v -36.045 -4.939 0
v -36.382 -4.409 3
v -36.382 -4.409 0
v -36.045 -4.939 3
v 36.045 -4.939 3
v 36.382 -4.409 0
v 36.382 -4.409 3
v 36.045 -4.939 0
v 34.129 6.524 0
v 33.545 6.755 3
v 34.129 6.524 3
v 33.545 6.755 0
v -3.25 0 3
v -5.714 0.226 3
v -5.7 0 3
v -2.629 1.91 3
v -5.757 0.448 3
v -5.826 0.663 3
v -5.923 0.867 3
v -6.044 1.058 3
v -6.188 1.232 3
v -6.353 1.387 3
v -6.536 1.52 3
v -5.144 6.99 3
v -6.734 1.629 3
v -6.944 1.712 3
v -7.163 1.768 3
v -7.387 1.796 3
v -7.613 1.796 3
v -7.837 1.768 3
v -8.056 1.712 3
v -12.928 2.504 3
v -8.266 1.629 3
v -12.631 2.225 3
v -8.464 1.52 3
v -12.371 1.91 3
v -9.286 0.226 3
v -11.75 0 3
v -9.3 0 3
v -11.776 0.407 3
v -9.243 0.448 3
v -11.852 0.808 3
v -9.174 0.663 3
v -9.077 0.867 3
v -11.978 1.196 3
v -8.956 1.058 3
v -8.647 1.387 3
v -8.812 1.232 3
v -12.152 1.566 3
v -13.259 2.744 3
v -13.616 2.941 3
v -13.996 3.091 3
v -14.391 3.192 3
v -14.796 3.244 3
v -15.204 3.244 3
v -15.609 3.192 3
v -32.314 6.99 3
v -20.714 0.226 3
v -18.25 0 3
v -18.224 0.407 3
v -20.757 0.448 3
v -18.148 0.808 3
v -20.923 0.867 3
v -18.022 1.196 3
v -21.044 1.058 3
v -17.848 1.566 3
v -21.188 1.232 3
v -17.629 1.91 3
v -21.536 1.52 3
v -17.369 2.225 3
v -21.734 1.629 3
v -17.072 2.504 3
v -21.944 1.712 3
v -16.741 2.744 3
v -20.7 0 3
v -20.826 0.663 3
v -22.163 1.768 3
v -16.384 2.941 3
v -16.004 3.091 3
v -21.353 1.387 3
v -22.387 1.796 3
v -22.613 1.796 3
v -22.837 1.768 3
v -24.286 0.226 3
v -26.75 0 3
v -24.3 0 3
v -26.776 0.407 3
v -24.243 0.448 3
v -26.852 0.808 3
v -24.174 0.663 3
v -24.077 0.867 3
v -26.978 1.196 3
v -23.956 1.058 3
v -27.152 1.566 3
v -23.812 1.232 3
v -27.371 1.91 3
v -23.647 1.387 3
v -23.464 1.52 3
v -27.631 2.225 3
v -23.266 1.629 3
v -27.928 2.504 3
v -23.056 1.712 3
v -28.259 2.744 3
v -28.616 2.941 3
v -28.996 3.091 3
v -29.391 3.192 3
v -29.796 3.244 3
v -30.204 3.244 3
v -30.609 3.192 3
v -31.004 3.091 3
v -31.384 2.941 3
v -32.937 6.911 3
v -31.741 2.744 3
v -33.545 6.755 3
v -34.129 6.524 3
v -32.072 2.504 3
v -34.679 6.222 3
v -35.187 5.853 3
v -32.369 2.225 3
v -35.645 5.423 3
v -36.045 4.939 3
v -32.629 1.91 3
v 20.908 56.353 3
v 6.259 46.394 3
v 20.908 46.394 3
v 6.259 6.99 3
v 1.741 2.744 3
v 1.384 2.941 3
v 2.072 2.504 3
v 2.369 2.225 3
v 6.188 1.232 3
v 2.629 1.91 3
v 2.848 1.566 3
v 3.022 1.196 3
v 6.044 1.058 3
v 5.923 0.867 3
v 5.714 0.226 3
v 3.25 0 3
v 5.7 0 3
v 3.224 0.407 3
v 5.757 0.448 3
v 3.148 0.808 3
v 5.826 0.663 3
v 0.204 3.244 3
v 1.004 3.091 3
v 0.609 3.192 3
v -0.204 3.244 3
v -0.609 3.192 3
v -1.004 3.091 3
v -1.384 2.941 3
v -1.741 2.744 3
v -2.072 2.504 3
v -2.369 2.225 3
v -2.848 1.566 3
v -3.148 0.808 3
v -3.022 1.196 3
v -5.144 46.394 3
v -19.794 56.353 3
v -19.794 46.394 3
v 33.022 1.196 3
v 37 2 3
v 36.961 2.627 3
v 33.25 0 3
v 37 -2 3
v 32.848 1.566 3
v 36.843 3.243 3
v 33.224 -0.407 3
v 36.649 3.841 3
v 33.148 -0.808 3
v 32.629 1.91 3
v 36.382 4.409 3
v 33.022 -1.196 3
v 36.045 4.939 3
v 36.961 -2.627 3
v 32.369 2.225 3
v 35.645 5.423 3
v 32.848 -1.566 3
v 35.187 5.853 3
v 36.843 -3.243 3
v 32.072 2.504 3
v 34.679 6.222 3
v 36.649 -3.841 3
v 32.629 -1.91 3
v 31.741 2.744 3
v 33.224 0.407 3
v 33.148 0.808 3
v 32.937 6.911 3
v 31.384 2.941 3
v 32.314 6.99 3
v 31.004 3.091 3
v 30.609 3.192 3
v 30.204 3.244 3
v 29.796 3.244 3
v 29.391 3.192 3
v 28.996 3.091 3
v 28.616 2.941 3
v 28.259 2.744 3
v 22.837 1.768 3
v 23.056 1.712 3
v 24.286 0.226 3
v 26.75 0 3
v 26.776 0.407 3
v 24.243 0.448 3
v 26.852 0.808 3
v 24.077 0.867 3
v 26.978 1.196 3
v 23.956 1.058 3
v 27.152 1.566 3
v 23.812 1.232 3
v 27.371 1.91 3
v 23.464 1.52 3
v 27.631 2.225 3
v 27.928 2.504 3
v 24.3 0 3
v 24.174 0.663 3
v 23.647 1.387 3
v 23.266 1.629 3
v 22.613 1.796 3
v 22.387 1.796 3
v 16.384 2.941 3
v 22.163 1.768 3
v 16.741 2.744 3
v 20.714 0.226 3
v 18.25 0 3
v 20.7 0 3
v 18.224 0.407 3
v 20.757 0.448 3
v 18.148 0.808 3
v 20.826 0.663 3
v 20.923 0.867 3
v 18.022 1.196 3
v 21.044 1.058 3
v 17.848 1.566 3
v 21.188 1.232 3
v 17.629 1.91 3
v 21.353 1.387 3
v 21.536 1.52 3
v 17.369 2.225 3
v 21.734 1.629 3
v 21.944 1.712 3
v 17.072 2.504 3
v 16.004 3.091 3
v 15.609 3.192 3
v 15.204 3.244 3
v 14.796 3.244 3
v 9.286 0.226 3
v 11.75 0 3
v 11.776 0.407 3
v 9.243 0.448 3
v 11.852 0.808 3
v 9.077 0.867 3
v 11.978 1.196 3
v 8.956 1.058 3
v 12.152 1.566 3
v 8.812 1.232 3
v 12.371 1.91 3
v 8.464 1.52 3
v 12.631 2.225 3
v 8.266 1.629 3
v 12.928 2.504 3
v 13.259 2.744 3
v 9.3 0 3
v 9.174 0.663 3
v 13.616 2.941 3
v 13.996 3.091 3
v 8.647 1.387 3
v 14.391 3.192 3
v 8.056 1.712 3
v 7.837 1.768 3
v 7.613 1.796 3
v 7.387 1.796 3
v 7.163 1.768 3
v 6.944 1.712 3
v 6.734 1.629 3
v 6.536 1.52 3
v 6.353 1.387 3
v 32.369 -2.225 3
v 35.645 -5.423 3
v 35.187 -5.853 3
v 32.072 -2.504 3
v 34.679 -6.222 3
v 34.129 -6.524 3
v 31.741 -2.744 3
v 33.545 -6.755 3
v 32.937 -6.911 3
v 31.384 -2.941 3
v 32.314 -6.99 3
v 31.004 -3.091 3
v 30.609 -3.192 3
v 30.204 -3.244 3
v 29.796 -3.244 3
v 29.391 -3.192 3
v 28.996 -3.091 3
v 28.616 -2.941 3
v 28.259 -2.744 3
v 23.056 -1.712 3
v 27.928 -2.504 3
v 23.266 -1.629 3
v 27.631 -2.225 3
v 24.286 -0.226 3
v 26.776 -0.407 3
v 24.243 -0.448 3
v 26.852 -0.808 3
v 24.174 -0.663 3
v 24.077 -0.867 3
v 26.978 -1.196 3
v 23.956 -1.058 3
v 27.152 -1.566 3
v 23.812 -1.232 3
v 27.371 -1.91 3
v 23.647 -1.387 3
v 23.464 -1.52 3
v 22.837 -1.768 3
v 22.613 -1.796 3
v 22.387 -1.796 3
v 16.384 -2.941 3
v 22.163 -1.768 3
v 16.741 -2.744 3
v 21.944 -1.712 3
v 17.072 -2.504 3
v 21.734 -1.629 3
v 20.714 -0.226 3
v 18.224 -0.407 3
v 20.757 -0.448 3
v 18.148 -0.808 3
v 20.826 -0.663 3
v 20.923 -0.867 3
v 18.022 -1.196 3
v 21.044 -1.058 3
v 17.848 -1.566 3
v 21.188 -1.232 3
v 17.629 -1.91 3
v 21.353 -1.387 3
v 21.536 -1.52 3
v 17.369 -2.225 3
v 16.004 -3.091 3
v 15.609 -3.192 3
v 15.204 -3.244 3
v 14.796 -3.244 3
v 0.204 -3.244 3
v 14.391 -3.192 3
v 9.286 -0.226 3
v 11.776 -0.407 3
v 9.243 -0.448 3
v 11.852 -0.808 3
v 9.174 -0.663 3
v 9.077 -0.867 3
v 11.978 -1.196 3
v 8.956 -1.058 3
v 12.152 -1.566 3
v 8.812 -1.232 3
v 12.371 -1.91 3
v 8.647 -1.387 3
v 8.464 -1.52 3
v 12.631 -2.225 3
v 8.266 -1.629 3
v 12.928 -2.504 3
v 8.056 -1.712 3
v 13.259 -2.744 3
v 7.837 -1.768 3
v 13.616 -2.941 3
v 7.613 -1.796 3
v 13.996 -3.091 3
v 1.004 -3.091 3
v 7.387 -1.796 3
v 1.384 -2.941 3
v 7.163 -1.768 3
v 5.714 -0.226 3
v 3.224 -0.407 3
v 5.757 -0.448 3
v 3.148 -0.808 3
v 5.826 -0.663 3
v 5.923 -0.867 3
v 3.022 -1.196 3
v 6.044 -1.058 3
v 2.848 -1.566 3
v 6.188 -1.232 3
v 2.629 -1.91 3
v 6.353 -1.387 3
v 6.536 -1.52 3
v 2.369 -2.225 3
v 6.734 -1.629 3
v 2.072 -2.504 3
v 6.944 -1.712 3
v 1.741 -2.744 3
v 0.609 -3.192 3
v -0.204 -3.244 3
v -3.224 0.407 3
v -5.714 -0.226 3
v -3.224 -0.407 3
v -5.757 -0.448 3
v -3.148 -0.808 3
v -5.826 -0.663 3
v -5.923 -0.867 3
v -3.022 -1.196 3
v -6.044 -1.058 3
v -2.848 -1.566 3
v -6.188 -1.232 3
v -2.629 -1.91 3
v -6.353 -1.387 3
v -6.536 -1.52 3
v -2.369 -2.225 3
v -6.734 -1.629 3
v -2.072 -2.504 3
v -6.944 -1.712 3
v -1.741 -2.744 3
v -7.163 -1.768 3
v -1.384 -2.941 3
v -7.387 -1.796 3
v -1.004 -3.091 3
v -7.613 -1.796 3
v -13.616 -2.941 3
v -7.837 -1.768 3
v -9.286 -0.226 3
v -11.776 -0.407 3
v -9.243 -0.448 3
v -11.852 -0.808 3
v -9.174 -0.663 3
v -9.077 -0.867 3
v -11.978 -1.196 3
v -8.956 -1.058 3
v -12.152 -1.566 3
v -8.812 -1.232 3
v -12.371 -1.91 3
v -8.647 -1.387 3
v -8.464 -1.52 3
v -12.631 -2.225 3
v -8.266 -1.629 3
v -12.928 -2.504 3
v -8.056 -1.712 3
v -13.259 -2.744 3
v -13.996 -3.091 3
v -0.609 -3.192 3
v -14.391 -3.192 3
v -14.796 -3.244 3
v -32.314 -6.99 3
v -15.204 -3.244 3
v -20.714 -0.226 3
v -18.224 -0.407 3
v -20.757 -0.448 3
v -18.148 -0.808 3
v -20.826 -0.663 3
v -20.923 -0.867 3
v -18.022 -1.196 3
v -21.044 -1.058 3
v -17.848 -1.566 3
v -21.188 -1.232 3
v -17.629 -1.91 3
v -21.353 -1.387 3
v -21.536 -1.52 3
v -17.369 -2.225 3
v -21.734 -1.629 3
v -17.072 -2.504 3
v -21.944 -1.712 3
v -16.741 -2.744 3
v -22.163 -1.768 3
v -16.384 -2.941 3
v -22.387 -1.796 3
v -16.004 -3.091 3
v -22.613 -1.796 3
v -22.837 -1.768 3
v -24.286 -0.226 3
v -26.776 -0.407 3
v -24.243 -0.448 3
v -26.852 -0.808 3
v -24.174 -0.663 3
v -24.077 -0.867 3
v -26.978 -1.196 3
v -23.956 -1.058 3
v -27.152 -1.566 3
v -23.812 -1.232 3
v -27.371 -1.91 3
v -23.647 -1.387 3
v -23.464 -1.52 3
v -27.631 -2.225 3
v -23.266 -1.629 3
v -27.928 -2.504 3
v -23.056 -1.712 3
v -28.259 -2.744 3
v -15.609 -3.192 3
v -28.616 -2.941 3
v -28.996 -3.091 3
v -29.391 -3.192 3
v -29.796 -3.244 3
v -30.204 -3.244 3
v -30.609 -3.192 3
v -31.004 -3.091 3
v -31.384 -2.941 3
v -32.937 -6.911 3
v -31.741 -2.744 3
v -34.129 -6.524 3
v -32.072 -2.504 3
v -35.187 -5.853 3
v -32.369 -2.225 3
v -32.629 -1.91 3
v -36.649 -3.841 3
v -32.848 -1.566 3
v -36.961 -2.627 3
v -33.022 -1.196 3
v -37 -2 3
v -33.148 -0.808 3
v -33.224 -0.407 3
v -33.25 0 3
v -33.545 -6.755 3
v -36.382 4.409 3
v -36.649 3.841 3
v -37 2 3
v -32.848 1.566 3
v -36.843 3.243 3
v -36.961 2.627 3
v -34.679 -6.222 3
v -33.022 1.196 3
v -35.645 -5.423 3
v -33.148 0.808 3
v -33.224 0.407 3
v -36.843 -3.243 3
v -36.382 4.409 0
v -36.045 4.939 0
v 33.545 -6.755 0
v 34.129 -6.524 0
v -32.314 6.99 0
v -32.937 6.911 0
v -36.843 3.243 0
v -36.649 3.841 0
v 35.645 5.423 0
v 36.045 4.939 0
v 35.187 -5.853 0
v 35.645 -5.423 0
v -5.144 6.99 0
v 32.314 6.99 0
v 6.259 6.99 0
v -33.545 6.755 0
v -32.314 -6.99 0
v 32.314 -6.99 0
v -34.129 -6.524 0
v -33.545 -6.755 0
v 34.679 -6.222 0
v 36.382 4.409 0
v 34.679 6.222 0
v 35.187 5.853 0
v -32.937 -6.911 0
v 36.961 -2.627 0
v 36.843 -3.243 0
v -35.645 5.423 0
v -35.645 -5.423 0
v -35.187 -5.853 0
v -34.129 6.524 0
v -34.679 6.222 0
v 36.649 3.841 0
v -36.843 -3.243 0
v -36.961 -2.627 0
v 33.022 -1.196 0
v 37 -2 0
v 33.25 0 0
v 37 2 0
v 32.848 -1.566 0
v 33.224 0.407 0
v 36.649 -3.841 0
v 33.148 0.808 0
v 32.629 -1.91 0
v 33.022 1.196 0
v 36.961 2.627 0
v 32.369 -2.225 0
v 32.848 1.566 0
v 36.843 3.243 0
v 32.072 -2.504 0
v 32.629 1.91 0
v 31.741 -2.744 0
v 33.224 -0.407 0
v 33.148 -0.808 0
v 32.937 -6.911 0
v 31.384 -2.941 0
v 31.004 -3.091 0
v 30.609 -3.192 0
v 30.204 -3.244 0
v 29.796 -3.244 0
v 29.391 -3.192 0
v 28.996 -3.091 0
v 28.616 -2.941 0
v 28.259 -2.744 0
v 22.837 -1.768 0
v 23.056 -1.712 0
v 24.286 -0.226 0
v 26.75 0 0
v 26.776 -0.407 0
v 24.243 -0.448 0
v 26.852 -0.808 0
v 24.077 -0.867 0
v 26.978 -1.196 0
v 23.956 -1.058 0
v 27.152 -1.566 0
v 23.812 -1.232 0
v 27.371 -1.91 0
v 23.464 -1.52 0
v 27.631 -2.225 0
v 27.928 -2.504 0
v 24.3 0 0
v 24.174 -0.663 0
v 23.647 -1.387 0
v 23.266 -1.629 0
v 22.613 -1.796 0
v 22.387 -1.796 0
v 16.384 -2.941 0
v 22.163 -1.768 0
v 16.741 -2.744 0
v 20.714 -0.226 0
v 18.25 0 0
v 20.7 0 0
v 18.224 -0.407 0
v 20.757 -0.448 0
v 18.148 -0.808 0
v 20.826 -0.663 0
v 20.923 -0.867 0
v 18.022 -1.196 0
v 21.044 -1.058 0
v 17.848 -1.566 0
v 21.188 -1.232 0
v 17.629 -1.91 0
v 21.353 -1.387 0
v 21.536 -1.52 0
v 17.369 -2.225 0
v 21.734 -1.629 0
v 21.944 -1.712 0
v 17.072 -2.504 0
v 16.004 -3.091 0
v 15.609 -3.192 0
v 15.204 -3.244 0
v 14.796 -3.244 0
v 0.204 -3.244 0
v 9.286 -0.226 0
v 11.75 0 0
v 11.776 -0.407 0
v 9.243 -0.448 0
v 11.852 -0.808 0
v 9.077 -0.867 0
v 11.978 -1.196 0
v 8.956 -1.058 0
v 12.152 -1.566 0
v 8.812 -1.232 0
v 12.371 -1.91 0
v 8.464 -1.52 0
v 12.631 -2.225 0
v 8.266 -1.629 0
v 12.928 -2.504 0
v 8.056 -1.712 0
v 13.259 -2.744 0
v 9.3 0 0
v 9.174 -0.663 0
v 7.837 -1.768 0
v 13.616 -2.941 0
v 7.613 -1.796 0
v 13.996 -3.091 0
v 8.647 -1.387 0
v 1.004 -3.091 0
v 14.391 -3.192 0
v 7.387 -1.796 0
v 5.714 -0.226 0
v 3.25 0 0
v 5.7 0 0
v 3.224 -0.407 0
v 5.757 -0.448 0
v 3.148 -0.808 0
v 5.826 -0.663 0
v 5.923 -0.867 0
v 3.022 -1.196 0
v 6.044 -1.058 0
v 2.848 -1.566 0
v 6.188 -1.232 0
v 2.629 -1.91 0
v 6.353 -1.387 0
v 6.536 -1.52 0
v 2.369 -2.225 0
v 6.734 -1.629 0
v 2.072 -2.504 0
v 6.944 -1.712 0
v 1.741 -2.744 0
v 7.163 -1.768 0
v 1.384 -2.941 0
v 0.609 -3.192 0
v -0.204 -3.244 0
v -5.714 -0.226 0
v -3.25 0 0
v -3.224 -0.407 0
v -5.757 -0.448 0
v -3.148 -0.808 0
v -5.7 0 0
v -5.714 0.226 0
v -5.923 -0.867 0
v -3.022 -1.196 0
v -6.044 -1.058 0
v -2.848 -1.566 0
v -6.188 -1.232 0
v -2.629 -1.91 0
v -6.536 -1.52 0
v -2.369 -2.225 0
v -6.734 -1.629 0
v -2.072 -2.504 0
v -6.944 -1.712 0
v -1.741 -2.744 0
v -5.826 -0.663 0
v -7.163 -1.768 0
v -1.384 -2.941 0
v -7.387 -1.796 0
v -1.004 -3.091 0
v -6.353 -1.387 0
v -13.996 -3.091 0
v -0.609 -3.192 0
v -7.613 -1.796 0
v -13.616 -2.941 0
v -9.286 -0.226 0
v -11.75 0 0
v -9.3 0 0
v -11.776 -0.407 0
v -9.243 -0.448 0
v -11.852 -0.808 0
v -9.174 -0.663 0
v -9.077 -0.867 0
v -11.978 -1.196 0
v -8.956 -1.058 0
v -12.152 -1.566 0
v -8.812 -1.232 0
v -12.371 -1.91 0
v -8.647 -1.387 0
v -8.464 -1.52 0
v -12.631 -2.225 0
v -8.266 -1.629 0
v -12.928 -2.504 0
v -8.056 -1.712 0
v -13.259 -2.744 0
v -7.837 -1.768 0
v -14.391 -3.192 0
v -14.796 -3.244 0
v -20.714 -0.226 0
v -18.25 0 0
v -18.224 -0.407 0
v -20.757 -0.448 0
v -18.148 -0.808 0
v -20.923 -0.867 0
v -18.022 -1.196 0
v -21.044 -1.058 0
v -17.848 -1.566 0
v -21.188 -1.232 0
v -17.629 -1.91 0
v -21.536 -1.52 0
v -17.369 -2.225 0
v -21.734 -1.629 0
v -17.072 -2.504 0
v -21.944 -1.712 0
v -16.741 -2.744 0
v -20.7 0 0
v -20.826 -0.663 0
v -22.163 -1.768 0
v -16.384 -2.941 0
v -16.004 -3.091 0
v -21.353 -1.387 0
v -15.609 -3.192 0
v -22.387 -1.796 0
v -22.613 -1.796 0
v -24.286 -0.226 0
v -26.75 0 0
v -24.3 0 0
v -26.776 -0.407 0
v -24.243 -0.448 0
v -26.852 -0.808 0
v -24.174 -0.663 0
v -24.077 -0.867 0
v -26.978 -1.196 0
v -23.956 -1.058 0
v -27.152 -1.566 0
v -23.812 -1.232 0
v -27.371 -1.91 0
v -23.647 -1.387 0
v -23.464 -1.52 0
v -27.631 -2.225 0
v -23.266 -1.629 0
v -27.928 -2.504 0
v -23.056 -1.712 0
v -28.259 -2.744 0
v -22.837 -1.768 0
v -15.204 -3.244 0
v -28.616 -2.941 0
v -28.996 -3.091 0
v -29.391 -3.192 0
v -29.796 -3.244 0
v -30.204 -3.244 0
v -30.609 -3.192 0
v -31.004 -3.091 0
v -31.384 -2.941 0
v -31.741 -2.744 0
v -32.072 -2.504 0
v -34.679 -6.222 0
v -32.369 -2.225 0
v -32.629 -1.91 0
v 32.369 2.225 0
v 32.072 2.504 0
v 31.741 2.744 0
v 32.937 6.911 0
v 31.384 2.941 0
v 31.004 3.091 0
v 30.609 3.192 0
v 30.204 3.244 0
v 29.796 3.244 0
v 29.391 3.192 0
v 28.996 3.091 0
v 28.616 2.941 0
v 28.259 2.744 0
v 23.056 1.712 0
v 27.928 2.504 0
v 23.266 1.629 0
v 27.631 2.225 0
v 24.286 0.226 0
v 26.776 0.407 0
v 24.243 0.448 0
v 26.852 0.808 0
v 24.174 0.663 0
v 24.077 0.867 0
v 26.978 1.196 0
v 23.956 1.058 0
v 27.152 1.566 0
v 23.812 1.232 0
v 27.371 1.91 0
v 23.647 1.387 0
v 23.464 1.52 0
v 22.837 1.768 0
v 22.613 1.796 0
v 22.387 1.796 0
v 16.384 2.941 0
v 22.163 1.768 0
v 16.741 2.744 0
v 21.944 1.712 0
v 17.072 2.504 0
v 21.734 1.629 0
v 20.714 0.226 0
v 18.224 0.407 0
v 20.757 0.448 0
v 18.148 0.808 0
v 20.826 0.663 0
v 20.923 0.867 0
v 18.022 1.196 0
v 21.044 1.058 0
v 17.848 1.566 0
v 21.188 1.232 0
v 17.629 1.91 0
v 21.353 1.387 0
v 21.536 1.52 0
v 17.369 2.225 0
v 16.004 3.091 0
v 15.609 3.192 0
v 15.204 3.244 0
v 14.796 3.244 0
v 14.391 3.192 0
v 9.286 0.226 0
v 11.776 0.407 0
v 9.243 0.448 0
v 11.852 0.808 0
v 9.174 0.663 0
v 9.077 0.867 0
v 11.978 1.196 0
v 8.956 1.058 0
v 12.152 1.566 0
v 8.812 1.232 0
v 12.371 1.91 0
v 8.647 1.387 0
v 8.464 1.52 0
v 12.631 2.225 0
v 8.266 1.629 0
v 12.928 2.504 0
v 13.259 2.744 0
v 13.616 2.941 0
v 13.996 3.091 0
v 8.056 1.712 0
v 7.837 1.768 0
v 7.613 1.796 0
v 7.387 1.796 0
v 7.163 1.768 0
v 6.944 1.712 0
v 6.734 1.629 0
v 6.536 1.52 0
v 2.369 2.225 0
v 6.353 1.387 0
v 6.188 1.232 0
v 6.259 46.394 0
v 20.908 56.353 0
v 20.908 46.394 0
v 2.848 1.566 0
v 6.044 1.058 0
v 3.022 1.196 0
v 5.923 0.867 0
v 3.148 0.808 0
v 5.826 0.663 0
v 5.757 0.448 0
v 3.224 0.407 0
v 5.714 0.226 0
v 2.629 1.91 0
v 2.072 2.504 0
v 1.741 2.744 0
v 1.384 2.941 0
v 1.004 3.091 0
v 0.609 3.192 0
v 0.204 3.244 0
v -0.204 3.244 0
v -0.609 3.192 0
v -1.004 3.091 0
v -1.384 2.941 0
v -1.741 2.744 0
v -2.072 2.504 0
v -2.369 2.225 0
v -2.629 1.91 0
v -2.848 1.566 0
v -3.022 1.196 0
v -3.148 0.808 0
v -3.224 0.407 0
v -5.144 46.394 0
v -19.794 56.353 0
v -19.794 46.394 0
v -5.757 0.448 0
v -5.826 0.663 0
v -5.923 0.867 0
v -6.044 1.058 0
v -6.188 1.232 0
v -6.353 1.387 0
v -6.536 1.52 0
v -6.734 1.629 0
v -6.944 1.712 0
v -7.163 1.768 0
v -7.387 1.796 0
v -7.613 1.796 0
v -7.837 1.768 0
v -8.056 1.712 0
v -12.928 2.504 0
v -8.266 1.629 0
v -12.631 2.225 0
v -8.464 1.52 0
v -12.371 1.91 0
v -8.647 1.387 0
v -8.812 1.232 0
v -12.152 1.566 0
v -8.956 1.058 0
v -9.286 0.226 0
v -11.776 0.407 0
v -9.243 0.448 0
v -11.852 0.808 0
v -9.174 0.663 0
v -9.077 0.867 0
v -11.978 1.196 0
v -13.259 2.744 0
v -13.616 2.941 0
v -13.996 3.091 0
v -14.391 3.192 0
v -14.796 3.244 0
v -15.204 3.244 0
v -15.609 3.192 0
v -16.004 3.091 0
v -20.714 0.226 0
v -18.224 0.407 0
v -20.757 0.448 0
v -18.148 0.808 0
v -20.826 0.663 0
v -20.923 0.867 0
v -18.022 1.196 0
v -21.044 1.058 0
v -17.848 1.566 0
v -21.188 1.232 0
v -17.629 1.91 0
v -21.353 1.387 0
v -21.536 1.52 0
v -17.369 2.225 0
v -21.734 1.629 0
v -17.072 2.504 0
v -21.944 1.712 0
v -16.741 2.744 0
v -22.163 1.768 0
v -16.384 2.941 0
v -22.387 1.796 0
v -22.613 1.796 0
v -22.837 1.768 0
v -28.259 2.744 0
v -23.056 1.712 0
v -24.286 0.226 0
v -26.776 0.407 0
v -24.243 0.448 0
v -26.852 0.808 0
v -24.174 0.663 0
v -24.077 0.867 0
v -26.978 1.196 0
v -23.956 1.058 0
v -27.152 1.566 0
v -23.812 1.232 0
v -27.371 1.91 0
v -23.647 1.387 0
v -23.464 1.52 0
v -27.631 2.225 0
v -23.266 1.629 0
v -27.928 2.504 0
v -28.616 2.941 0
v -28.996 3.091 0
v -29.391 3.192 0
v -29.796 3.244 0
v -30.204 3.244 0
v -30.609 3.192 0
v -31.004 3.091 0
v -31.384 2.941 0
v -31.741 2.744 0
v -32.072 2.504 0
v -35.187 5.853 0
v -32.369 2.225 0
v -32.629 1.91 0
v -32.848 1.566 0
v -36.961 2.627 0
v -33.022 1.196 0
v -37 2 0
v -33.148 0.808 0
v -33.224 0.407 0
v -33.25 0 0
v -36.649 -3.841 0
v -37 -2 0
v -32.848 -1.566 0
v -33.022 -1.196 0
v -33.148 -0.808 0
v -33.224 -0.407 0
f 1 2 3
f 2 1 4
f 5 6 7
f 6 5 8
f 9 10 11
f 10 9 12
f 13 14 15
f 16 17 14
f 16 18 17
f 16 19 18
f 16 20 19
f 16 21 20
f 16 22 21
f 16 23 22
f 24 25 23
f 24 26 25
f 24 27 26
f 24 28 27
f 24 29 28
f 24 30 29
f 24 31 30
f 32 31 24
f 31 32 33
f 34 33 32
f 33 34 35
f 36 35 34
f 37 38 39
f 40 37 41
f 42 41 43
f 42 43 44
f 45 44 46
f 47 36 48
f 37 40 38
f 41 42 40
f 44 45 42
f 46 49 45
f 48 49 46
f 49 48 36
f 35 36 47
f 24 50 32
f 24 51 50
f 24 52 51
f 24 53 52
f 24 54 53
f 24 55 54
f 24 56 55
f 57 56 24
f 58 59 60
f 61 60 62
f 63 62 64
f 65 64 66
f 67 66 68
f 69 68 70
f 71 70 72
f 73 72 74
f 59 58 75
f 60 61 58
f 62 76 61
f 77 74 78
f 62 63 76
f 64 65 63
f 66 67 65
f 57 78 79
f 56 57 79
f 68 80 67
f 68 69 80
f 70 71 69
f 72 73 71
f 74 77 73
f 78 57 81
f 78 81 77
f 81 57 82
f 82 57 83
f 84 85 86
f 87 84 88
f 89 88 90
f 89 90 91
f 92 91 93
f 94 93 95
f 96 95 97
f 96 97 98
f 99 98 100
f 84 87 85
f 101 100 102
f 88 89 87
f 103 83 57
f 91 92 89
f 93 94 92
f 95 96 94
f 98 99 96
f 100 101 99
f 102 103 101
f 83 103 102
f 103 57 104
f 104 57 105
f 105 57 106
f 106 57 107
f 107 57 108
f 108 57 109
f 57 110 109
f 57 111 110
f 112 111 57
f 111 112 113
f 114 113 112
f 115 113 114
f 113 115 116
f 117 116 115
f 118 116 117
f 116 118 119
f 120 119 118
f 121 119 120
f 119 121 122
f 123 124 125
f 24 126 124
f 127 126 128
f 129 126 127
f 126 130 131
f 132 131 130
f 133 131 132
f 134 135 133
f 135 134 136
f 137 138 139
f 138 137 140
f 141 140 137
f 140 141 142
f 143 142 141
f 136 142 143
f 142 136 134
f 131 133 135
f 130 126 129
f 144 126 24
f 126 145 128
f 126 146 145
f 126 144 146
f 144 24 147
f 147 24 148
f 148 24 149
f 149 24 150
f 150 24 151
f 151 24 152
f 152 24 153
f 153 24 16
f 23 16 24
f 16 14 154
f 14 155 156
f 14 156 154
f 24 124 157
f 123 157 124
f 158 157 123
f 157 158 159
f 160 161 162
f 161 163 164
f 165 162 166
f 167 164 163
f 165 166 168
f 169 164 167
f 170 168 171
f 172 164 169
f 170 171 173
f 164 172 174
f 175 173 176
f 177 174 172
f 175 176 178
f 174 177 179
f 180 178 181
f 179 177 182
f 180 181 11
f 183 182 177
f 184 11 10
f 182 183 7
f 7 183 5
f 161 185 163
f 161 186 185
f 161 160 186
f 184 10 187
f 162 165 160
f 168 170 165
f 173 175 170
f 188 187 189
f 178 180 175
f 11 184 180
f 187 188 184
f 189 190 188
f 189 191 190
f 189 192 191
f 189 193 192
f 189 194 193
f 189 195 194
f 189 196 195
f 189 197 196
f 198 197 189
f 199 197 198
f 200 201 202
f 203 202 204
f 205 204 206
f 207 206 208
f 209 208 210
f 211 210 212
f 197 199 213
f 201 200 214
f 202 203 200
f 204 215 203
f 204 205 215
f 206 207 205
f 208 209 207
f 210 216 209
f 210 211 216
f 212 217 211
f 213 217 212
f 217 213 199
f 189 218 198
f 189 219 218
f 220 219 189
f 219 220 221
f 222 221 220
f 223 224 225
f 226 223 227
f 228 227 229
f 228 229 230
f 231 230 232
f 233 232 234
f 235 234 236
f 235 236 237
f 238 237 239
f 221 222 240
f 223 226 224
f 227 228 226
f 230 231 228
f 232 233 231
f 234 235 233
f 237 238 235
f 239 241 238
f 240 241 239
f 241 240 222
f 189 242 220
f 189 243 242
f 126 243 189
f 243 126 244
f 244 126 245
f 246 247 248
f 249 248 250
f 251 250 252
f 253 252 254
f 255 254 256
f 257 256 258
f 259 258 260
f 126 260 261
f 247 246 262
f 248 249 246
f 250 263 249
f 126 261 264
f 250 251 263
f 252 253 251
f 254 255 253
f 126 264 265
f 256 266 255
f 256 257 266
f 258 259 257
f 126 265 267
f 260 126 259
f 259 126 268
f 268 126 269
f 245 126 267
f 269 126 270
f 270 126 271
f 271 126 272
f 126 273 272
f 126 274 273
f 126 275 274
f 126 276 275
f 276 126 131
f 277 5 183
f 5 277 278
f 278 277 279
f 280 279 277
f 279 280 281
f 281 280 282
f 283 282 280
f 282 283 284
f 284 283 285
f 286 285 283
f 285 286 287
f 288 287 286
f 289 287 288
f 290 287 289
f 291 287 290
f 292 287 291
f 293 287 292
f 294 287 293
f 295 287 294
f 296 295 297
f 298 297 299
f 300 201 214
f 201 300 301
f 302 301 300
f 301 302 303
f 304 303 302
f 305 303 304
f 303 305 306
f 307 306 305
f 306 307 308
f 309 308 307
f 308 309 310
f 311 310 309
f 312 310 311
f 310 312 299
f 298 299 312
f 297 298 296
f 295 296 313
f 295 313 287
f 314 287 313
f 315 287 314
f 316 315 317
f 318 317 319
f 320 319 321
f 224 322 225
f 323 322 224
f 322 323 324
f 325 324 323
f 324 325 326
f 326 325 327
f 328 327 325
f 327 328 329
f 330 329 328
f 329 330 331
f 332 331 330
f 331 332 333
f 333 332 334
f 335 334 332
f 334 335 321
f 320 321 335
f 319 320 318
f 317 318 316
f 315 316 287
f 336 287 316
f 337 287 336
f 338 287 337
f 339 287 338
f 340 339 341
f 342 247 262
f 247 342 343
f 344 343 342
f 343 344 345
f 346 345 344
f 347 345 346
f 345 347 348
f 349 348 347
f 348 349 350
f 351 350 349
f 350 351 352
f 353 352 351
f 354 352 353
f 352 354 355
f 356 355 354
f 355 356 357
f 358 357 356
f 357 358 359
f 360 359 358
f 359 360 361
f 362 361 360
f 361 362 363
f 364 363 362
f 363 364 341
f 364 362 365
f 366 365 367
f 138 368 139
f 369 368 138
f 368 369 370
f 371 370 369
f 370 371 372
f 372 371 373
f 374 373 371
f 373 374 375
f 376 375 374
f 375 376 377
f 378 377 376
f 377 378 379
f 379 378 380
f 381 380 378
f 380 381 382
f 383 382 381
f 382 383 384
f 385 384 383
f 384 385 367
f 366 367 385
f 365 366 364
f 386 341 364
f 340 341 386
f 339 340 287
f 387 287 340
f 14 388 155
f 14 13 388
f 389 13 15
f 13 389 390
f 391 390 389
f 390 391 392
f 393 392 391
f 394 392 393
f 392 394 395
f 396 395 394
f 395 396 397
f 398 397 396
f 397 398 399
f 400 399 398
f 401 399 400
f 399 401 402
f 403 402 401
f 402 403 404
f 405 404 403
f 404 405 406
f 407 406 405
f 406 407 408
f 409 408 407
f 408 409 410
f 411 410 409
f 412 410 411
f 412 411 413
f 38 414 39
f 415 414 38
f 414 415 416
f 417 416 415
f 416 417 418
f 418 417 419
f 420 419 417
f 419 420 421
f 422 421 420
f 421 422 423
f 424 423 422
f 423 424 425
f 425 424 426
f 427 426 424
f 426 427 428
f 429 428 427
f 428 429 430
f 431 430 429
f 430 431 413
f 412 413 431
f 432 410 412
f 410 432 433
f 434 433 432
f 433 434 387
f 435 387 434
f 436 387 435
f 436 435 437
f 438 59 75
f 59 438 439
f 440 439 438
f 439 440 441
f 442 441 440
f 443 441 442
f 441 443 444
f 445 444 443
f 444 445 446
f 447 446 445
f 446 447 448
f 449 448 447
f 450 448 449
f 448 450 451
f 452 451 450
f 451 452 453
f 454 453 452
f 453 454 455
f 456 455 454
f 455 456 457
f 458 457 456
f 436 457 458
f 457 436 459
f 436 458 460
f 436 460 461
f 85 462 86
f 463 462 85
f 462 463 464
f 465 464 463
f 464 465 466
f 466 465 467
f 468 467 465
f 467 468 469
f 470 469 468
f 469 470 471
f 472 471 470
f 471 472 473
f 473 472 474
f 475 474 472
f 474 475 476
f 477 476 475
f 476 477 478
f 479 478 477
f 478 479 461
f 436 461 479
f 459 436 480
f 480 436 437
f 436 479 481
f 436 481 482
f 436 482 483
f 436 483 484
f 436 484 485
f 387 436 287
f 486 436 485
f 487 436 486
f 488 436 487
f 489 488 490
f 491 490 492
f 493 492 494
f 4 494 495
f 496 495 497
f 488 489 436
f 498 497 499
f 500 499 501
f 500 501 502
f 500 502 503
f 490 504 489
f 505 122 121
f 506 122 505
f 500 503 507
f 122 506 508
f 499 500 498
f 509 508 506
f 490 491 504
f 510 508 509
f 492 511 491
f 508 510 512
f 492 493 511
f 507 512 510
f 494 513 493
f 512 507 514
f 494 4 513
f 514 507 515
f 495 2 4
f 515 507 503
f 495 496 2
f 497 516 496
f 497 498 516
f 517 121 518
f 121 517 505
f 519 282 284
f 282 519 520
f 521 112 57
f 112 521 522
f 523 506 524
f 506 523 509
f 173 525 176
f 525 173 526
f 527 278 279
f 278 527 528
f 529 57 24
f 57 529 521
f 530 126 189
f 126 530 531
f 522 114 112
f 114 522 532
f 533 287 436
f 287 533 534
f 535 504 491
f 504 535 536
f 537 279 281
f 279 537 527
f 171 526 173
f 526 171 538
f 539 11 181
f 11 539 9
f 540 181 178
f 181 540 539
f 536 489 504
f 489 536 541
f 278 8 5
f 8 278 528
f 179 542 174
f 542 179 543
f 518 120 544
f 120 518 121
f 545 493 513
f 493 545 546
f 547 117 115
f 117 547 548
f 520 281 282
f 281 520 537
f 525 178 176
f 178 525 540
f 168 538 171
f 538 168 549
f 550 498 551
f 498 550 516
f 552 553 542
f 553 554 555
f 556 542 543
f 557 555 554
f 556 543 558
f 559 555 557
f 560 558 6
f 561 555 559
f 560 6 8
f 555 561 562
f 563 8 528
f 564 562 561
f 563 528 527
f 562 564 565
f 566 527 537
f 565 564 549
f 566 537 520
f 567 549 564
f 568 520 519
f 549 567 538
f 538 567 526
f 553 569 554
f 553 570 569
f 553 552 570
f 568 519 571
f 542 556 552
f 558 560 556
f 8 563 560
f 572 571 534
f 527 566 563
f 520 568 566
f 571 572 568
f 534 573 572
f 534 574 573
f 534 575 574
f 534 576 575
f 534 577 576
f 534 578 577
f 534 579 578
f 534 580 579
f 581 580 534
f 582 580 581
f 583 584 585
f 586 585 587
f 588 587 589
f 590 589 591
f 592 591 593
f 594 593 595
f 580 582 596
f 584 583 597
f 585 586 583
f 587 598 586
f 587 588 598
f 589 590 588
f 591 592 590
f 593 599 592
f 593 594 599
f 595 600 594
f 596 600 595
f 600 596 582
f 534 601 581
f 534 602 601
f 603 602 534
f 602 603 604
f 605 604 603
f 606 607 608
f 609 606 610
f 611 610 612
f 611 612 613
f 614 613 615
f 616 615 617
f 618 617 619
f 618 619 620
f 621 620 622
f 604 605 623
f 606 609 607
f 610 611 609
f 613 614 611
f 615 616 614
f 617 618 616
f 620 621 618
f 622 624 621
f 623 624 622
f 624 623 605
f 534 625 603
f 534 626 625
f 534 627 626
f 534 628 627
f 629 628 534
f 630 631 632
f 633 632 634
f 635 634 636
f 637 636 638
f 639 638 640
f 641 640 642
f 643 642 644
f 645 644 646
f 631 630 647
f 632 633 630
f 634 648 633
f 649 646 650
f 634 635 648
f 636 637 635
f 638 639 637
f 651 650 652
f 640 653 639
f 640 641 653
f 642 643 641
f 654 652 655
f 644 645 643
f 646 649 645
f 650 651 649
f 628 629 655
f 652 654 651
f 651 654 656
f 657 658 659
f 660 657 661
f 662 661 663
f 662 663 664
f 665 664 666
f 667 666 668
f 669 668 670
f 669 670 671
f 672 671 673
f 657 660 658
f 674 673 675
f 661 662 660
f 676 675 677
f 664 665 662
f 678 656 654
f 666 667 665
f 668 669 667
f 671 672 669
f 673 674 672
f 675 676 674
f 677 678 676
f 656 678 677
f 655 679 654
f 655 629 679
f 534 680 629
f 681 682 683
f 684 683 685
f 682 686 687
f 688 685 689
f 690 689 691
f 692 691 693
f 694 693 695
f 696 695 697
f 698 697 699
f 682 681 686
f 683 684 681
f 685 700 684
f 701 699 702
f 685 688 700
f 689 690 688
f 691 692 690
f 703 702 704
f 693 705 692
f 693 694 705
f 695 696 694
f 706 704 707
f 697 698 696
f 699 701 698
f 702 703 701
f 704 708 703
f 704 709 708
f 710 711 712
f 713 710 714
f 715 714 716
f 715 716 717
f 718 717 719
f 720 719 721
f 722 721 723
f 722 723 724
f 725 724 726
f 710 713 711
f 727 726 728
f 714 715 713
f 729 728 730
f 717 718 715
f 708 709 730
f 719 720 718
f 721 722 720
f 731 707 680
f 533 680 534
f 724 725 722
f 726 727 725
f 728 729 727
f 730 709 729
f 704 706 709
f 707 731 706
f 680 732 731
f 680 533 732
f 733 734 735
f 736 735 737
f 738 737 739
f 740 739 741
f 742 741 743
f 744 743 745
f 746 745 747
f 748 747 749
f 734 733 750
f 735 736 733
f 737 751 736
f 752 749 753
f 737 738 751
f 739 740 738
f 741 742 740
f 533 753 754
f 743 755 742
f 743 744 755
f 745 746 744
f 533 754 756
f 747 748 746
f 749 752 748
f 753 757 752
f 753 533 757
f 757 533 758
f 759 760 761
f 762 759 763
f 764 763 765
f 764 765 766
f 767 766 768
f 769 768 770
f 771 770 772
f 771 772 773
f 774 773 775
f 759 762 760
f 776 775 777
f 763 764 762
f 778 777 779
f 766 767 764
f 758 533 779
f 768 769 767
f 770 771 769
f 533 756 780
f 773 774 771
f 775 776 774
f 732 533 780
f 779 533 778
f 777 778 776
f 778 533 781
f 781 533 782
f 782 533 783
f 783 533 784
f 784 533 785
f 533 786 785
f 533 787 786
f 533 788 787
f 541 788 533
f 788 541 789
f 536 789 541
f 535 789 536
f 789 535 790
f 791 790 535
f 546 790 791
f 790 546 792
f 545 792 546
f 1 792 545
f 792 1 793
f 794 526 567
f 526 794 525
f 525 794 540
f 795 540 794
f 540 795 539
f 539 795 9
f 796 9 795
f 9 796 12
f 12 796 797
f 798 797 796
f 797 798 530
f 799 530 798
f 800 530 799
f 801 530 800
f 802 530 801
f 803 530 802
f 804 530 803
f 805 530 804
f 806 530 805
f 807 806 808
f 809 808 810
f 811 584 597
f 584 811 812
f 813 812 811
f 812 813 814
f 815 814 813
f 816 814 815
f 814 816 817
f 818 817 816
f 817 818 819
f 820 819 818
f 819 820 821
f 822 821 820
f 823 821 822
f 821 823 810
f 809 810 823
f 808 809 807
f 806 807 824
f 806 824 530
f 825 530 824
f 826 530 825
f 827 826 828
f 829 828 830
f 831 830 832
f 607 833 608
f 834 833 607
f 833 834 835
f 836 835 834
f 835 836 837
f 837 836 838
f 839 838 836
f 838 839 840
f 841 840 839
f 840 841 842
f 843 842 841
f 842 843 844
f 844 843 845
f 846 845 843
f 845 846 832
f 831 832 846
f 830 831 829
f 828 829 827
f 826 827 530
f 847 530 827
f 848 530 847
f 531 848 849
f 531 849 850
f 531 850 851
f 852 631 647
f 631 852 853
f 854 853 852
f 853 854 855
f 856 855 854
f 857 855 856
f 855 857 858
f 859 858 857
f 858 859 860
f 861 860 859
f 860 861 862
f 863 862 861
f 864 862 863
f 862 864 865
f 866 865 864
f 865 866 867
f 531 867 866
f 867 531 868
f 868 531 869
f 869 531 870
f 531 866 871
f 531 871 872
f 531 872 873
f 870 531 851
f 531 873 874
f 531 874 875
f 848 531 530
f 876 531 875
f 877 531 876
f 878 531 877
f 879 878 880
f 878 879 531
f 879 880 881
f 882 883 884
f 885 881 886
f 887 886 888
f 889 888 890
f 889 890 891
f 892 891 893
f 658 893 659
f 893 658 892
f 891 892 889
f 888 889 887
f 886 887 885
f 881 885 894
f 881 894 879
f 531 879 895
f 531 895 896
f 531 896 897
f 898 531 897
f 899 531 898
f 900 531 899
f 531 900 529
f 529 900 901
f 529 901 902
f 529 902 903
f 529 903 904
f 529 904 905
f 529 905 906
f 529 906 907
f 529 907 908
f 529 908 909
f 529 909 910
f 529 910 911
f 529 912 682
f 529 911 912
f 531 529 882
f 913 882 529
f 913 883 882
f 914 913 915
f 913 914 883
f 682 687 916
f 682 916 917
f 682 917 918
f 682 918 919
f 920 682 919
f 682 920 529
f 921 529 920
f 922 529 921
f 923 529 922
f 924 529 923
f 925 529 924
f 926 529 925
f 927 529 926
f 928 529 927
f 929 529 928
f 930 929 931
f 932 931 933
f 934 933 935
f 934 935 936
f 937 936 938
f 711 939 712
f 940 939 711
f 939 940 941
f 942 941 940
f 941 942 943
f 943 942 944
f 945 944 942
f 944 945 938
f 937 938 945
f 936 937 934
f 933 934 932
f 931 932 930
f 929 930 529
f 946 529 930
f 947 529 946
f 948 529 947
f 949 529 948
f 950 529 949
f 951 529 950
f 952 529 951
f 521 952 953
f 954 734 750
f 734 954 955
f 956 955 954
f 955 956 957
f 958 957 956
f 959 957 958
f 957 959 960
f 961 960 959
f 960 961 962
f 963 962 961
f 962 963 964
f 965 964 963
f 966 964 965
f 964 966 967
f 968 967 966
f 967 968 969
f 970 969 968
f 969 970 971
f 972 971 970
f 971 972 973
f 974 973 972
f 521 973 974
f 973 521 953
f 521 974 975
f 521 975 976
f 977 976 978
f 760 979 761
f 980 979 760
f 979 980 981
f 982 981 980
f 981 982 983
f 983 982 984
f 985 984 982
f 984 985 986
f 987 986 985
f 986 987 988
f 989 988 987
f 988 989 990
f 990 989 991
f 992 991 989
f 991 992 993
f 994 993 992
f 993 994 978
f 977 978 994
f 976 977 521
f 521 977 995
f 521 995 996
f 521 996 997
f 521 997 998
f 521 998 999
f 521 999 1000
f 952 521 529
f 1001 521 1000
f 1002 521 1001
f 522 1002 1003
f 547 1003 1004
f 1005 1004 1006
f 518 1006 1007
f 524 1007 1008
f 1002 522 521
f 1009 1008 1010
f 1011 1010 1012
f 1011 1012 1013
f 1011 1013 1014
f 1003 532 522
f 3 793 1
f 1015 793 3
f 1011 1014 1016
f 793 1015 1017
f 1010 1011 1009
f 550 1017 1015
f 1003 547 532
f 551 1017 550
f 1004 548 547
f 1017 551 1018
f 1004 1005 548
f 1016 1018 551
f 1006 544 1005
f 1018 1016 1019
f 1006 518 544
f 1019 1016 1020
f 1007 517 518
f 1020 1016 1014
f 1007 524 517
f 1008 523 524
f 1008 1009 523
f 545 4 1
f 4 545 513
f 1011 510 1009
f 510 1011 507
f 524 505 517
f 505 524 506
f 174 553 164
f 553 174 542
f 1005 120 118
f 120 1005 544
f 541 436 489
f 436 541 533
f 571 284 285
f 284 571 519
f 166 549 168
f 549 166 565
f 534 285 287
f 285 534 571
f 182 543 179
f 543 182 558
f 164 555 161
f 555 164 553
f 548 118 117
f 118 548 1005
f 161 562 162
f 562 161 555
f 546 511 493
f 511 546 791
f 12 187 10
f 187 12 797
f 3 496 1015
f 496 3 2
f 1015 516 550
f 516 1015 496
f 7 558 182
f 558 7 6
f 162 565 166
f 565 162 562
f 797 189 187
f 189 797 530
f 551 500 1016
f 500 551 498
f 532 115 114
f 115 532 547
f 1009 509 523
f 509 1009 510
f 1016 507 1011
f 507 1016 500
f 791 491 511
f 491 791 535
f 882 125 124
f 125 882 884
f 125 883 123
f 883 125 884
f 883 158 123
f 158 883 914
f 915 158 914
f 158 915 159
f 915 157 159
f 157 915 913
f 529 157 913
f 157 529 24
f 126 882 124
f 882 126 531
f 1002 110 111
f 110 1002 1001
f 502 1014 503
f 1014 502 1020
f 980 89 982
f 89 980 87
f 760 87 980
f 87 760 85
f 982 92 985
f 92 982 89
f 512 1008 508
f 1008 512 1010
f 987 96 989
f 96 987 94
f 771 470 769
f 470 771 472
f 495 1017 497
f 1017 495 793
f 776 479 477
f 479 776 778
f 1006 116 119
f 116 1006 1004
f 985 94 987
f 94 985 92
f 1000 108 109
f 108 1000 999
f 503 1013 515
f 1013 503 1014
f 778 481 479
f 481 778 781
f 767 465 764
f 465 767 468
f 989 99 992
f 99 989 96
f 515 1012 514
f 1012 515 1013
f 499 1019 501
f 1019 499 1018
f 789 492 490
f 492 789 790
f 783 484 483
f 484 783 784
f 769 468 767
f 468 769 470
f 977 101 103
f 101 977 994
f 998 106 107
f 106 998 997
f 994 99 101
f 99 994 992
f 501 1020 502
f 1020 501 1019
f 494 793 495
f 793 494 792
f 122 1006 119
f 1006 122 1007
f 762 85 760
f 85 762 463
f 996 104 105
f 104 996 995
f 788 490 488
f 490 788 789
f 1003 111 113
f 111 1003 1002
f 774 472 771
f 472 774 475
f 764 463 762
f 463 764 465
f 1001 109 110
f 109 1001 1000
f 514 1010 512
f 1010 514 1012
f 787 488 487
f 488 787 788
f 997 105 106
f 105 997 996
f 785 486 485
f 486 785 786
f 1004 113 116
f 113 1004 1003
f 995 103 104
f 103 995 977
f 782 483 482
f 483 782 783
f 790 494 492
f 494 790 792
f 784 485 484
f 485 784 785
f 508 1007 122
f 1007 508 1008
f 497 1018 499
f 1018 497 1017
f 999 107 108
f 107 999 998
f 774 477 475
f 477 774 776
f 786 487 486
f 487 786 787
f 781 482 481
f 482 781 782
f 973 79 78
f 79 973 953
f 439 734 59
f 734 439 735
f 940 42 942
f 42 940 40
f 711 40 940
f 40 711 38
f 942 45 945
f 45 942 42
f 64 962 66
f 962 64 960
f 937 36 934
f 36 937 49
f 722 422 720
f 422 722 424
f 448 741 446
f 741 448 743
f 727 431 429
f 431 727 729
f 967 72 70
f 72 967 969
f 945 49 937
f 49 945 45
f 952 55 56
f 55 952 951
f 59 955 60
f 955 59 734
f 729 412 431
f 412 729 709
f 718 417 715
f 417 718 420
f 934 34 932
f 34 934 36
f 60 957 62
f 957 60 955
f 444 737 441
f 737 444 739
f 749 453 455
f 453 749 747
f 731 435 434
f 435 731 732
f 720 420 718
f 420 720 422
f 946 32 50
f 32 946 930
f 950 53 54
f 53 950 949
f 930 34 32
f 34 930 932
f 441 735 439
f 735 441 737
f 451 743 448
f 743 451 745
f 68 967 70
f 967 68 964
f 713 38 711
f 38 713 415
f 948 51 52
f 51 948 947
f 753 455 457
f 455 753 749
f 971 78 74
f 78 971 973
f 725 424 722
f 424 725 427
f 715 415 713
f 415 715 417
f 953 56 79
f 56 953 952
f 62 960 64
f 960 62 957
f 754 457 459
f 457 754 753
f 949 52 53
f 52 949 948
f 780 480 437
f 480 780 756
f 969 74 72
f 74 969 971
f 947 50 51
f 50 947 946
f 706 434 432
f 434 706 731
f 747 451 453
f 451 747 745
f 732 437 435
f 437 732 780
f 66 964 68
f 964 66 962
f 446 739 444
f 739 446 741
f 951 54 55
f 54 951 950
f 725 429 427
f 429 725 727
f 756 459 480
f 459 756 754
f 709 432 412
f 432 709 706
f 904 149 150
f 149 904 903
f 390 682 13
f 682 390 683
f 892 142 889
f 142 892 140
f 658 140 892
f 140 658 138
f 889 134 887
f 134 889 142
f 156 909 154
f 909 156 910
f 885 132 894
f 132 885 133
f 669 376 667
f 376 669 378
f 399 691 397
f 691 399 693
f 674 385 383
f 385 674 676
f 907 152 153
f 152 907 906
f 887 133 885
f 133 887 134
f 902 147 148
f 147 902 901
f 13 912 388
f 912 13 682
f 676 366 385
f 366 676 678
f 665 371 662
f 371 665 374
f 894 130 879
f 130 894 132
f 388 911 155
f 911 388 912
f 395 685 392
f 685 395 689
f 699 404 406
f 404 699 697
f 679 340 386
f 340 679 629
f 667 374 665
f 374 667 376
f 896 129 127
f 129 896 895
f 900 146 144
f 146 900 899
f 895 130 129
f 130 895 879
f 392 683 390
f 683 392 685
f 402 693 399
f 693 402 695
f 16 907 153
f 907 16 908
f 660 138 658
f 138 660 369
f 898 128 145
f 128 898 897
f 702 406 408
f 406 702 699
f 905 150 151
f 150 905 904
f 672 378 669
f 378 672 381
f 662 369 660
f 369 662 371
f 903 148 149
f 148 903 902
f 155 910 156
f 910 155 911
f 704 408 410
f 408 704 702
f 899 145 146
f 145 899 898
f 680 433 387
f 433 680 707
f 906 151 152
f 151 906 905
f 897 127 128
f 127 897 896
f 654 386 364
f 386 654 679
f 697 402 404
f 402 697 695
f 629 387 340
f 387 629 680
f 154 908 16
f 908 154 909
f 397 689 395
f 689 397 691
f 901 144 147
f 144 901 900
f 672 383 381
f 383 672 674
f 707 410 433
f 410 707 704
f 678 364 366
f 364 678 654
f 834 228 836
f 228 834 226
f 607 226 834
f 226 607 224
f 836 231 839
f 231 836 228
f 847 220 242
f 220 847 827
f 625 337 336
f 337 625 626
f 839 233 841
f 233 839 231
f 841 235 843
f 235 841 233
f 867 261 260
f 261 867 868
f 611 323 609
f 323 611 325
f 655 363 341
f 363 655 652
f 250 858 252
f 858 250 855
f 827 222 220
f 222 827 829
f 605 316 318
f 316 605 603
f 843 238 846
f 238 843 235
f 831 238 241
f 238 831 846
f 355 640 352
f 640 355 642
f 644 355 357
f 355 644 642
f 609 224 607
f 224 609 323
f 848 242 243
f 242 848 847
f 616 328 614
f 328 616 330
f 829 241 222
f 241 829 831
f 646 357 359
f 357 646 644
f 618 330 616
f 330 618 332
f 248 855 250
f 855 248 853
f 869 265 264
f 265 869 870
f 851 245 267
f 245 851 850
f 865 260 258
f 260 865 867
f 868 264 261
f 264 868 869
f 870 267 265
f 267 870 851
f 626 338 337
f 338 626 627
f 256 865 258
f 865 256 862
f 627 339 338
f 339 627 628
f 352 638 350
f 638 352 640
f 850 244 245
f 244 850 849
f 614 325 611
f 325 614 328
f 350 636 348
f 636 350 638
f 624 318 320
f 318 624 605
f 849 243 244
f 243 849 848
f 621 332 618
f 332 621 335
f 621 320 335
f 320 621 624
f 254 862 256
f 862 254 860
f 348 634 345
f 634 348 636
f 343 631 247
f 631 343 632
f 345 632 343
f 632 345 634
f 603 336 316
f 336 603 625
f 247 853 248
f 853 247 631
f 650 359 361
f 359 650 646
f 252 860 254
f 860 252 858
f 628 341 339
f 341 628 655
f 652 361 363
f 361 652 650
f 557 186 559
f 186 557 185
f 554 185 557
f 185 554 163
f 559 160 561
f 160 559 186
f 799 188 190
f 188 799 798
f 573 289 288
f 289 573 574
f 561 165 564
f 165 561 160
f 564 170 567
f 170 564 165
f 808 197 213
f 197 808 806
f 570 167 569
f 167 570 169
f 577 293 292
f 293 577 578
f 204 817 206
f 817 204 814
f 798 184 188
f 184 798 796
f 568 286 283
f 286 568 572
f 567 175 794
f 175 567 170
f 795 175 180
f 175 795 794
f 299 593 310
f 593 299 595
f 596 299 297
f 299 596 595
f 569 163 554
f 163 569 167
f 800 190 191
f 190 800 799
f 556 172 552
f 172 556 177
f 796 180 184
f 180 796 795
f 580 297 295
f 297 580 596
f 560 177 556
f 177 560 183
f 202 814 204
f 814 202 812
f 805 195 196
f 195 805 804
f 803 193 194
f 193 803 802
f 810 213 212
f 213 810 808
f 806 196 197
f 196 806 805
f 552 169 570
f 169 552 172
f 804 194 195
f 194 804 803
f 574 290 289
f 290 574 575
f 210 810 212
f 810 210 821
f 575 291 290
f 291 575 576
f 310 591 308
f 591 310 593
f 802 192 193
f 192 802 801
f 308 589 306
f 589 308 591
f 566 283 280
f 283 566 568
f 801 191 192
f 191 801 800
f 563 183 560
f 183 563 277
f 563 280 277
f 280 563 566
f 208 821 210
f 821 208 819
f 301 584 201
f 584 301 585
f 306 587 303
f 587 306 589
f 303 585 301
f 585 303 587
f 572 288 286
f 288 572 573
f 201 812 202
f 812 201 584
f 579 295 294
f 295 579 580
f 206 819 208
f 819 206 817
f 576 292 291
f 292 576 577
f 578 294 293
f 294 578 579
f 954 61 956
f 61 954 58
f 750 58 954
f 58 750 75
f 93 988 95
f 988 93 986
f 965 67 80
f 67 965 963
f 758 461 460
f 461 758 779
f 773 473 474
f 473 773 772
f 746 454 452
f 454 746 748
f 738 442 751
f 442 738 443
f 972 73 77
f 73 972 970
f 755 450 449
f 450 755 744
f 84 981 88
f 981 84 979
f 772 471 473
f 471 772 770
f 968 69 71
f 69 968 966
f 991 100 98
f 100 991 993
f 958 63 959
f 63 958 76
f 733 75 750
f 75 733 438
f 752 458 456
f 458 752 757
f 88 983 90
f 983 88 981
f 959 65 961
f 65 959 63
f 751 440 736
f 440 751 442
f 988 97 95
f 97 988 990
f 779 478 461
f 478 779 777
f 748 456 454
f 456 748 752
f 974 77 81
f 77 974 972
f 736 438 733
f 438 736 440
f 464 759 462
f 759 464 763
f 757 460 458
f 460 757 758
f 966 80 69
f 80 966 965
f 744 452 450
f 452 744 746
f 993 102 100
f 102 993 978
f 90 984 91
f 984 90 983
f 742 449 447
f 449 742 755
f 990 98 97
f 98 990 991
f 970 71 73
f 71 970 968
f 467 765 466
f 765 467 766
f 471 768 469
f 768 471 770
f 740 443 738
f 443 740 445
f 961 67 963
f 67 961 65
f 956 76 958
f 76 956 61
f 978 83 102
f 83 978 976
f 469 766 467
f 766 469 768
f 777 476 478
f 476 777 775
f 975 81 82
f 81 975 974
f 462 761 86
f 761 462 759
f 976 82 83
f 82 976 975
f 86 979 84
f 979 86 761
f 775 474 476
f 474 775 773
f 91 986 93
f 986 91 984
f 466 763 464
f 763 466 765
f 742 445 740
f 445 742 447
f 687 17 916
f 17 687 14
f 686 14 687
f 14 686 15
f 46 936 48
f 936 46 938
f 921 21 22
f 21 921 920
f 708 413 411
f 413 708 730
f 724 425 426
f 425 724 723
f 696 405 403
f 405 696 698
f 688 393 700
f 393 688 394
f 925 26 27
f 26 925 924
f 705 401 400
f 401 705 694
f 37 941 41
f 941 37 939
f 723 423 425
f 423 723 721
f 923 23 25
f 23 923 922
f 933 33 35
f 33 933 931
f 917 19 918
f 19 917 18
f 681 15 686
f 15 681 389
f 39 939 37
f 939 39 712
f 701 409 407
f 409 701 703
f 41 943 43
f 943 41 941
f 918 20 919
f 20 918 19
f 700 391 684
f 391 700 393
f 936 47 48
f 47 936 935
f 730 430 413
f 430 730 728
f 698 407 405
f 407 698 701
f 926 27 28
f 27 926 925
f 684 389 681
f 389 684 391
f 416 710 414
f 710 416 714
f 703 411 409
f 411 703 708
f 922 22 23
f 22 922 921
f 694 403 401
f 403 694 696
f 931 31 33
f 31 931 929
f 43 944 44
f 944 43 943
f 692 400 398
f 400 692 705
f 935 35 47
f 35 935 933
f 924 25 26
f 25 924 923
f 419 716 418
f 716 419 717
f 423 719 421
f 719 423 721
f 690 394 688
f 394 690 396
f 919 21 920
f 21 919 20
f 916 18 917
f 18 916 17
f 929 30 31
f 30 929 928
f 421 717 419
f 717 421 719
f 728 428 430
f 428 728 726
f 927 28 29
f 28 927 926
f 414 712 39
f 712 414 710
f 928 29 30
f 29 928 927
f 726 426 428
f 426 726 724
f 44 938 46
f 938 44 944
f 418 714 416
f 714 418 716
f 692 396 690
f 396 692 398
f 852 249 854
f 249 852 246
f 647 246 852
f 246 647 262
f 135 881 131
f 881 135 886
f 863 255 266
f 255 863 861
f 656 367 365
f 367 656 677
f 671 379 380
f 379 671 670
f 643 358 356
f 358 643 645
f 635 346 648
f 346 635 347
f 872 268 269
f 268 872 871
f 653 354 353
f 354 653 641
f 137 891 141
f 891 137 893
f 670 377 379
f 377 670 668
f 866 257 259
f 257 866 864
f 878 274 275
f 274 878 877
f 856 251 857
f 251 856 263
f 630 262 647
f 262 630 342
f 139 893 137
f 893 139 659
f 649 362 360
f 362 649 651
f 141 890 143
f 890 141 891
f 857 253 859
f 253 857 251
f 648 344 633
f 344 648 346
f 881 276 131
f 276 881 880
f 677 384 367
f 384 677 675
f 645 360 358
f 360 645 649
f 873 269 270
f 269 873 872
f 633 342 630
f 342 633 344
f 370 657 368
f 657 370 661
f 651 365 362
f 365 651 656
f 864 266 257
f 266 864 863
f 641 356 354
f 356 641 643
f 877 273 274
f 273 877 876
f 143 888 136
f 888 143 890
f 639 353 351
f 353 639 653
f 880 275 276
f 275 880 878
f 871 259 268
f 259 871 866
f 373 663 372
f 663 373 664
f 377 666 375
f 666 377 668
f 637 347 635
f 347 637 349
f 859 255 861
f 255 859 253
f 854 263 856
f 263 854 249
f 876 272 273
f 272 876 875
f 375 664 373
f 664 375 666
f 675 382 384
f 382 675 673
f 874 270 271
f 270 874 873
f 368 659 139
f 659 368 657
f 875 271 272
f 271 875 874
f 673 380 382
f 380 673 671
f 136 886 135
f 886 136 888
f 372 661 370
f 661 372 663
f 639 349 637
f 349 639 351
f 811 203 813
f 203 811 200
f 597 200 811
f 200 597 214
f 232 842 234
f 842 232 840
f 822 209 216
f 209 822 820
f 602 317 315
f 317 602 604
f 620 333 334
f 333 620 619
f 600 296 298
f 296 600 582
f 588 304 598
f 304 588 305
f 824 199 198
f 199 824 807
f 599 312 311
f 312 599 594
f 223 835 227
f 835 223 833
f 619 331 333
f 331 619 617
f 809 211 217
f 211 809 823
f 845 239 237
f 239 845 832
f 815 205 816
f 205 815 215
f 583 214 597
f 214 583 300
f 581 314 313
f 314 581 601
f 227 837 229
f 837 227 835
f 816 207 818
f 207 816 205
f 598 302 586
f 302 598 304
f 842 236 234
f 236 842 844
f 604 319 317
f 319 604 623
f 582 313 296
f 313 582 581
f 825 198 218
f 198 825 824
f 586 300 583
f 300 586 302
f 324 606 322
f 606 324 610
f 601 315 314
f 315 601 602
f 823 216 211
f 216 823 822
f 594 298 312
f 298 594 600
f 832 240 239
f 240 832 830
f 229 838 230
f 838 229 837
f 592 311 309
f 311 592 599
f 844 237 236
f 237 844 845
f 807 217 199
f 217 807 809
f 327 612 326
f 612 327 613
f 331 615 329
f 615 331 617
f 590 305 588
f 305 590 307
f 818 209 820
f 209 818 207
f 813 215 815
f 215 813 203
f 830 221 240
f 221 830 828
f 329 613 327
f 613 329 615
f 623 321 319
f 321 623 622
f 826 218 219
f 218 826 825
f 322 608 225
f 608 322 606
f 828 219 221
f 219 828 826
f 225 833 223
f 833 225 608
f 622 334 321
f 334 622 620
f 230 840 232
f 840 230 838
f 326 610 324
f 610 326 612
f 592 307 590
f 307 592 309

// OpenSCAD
$fn = 50;


difference() {
	union() {
		hull() {
			translate(v = [-32.0000000000, 2.0000000000, 0]) {
				cylinder(h = 3, r = 5);
			}
			translate(v = [32.0000000000, 2.0000000000, 0]) {
				cylinder(h = 3, r = 5);
			}
			translate(v = [-32.0000000000, -2.0000000000, 0]) {
				cylinder(h = 3, r = 5);
			}
			translate(v = [32.0000000000, -2.0000000000, 0]) {
				cylinder(h = 3, r = 5);
			}
		}
		translate(v = [0, 55, 0]) {
			linear_extrude(height = 3) {
				text(font = "DejaVu Sans Mono:style=Bold", halign = "center", size = 57.0000000000, text = "T", valign = "top");
			}
		}
	}
	union() {
		translate(v = [-30.0000000000, 0.0000000000, 0]) {
			translate(v = [0, 0, -100]) {
				cylinder(h = 200, r = 3.2500000000);
			}
		}
		translate(v = [-15.0000000000, 0.0000000000, 0]) {
			translate(v = [0, 0, -100]) {
				cylinder(h = 200, r = 3.2500000000);
			}
		}
		translate(v = [0, 0, -100]) {
			cylinder(h = 200, r = 3.2500000000);
		}
		translate(v = [15.0000000000, 0.0000000000, 0]) {
			translate(v = [0, 0, -100]) {
				cylinder(h = 200, r = 3.2500000000);
			}
		}
		translate(v = [30.0000000000, 0.0000000000, 0]) {
			translate(v = [0, 0, -100]) {
				cylinder(h = 200, r = 3.2500000000);
			}
		}
		translate(v = [-30.0000000000, 0.0000000000, 0]) {
			translate(v = [0, 0, -100]) {
				cylinder(h = 200, r = 1.8000000000);
			}
		}
		translate(v = [-22.5000000000, 0.0000000000, 0]) {
			translate(v = [0, 0, -100]) {
				cylinder(h = 200, r = 1.8000000000);
			}
		}
		translate(v = [-15.0000000000, 0.0000000000, 0]) {
			translate(v = [0, 0, -100]) {
				cylinder(h = 200, r = 1.8000000000);
			}
		}
		translate(v = [-7.5000000000, 0.0000000000, 0]) {
			translate(v = [0, 0, -100]) {
				cylinder(h = 200, r = 1.8000000000);
			}
		}
		translate(v = [0, 0, -100]) {
			cylinder(h = 200, r = 1.8000000000);
		}
		translate(v = [7.5000000000, 0.0000000000, 0]) {
			translate(v = [0, 0, -100]) {
				cylinder(h = 200, r = 1.8000000000);
			}
		}
		translate(v = [15.0000000000, 0.0000000000, 0]) {
			translate(v = [0, 0, -100]) {
				cylinder(h = 200, r = 1.8000000000);
			}
		}
		translate(v = [22.5000000000, 0.0000000000, 0]) {
			translate(v = [0, 0, -100]) {
				cylinder(h = 200, r = 1.8000000000);
			}
		}
		translate(v = [30.0000000000, 0.0000000000, 0]) {
			translate(v = [0, 0, -100]) {
				cylinder(h = 200, r = 1.8000000000);
			}
		}
	}
}
